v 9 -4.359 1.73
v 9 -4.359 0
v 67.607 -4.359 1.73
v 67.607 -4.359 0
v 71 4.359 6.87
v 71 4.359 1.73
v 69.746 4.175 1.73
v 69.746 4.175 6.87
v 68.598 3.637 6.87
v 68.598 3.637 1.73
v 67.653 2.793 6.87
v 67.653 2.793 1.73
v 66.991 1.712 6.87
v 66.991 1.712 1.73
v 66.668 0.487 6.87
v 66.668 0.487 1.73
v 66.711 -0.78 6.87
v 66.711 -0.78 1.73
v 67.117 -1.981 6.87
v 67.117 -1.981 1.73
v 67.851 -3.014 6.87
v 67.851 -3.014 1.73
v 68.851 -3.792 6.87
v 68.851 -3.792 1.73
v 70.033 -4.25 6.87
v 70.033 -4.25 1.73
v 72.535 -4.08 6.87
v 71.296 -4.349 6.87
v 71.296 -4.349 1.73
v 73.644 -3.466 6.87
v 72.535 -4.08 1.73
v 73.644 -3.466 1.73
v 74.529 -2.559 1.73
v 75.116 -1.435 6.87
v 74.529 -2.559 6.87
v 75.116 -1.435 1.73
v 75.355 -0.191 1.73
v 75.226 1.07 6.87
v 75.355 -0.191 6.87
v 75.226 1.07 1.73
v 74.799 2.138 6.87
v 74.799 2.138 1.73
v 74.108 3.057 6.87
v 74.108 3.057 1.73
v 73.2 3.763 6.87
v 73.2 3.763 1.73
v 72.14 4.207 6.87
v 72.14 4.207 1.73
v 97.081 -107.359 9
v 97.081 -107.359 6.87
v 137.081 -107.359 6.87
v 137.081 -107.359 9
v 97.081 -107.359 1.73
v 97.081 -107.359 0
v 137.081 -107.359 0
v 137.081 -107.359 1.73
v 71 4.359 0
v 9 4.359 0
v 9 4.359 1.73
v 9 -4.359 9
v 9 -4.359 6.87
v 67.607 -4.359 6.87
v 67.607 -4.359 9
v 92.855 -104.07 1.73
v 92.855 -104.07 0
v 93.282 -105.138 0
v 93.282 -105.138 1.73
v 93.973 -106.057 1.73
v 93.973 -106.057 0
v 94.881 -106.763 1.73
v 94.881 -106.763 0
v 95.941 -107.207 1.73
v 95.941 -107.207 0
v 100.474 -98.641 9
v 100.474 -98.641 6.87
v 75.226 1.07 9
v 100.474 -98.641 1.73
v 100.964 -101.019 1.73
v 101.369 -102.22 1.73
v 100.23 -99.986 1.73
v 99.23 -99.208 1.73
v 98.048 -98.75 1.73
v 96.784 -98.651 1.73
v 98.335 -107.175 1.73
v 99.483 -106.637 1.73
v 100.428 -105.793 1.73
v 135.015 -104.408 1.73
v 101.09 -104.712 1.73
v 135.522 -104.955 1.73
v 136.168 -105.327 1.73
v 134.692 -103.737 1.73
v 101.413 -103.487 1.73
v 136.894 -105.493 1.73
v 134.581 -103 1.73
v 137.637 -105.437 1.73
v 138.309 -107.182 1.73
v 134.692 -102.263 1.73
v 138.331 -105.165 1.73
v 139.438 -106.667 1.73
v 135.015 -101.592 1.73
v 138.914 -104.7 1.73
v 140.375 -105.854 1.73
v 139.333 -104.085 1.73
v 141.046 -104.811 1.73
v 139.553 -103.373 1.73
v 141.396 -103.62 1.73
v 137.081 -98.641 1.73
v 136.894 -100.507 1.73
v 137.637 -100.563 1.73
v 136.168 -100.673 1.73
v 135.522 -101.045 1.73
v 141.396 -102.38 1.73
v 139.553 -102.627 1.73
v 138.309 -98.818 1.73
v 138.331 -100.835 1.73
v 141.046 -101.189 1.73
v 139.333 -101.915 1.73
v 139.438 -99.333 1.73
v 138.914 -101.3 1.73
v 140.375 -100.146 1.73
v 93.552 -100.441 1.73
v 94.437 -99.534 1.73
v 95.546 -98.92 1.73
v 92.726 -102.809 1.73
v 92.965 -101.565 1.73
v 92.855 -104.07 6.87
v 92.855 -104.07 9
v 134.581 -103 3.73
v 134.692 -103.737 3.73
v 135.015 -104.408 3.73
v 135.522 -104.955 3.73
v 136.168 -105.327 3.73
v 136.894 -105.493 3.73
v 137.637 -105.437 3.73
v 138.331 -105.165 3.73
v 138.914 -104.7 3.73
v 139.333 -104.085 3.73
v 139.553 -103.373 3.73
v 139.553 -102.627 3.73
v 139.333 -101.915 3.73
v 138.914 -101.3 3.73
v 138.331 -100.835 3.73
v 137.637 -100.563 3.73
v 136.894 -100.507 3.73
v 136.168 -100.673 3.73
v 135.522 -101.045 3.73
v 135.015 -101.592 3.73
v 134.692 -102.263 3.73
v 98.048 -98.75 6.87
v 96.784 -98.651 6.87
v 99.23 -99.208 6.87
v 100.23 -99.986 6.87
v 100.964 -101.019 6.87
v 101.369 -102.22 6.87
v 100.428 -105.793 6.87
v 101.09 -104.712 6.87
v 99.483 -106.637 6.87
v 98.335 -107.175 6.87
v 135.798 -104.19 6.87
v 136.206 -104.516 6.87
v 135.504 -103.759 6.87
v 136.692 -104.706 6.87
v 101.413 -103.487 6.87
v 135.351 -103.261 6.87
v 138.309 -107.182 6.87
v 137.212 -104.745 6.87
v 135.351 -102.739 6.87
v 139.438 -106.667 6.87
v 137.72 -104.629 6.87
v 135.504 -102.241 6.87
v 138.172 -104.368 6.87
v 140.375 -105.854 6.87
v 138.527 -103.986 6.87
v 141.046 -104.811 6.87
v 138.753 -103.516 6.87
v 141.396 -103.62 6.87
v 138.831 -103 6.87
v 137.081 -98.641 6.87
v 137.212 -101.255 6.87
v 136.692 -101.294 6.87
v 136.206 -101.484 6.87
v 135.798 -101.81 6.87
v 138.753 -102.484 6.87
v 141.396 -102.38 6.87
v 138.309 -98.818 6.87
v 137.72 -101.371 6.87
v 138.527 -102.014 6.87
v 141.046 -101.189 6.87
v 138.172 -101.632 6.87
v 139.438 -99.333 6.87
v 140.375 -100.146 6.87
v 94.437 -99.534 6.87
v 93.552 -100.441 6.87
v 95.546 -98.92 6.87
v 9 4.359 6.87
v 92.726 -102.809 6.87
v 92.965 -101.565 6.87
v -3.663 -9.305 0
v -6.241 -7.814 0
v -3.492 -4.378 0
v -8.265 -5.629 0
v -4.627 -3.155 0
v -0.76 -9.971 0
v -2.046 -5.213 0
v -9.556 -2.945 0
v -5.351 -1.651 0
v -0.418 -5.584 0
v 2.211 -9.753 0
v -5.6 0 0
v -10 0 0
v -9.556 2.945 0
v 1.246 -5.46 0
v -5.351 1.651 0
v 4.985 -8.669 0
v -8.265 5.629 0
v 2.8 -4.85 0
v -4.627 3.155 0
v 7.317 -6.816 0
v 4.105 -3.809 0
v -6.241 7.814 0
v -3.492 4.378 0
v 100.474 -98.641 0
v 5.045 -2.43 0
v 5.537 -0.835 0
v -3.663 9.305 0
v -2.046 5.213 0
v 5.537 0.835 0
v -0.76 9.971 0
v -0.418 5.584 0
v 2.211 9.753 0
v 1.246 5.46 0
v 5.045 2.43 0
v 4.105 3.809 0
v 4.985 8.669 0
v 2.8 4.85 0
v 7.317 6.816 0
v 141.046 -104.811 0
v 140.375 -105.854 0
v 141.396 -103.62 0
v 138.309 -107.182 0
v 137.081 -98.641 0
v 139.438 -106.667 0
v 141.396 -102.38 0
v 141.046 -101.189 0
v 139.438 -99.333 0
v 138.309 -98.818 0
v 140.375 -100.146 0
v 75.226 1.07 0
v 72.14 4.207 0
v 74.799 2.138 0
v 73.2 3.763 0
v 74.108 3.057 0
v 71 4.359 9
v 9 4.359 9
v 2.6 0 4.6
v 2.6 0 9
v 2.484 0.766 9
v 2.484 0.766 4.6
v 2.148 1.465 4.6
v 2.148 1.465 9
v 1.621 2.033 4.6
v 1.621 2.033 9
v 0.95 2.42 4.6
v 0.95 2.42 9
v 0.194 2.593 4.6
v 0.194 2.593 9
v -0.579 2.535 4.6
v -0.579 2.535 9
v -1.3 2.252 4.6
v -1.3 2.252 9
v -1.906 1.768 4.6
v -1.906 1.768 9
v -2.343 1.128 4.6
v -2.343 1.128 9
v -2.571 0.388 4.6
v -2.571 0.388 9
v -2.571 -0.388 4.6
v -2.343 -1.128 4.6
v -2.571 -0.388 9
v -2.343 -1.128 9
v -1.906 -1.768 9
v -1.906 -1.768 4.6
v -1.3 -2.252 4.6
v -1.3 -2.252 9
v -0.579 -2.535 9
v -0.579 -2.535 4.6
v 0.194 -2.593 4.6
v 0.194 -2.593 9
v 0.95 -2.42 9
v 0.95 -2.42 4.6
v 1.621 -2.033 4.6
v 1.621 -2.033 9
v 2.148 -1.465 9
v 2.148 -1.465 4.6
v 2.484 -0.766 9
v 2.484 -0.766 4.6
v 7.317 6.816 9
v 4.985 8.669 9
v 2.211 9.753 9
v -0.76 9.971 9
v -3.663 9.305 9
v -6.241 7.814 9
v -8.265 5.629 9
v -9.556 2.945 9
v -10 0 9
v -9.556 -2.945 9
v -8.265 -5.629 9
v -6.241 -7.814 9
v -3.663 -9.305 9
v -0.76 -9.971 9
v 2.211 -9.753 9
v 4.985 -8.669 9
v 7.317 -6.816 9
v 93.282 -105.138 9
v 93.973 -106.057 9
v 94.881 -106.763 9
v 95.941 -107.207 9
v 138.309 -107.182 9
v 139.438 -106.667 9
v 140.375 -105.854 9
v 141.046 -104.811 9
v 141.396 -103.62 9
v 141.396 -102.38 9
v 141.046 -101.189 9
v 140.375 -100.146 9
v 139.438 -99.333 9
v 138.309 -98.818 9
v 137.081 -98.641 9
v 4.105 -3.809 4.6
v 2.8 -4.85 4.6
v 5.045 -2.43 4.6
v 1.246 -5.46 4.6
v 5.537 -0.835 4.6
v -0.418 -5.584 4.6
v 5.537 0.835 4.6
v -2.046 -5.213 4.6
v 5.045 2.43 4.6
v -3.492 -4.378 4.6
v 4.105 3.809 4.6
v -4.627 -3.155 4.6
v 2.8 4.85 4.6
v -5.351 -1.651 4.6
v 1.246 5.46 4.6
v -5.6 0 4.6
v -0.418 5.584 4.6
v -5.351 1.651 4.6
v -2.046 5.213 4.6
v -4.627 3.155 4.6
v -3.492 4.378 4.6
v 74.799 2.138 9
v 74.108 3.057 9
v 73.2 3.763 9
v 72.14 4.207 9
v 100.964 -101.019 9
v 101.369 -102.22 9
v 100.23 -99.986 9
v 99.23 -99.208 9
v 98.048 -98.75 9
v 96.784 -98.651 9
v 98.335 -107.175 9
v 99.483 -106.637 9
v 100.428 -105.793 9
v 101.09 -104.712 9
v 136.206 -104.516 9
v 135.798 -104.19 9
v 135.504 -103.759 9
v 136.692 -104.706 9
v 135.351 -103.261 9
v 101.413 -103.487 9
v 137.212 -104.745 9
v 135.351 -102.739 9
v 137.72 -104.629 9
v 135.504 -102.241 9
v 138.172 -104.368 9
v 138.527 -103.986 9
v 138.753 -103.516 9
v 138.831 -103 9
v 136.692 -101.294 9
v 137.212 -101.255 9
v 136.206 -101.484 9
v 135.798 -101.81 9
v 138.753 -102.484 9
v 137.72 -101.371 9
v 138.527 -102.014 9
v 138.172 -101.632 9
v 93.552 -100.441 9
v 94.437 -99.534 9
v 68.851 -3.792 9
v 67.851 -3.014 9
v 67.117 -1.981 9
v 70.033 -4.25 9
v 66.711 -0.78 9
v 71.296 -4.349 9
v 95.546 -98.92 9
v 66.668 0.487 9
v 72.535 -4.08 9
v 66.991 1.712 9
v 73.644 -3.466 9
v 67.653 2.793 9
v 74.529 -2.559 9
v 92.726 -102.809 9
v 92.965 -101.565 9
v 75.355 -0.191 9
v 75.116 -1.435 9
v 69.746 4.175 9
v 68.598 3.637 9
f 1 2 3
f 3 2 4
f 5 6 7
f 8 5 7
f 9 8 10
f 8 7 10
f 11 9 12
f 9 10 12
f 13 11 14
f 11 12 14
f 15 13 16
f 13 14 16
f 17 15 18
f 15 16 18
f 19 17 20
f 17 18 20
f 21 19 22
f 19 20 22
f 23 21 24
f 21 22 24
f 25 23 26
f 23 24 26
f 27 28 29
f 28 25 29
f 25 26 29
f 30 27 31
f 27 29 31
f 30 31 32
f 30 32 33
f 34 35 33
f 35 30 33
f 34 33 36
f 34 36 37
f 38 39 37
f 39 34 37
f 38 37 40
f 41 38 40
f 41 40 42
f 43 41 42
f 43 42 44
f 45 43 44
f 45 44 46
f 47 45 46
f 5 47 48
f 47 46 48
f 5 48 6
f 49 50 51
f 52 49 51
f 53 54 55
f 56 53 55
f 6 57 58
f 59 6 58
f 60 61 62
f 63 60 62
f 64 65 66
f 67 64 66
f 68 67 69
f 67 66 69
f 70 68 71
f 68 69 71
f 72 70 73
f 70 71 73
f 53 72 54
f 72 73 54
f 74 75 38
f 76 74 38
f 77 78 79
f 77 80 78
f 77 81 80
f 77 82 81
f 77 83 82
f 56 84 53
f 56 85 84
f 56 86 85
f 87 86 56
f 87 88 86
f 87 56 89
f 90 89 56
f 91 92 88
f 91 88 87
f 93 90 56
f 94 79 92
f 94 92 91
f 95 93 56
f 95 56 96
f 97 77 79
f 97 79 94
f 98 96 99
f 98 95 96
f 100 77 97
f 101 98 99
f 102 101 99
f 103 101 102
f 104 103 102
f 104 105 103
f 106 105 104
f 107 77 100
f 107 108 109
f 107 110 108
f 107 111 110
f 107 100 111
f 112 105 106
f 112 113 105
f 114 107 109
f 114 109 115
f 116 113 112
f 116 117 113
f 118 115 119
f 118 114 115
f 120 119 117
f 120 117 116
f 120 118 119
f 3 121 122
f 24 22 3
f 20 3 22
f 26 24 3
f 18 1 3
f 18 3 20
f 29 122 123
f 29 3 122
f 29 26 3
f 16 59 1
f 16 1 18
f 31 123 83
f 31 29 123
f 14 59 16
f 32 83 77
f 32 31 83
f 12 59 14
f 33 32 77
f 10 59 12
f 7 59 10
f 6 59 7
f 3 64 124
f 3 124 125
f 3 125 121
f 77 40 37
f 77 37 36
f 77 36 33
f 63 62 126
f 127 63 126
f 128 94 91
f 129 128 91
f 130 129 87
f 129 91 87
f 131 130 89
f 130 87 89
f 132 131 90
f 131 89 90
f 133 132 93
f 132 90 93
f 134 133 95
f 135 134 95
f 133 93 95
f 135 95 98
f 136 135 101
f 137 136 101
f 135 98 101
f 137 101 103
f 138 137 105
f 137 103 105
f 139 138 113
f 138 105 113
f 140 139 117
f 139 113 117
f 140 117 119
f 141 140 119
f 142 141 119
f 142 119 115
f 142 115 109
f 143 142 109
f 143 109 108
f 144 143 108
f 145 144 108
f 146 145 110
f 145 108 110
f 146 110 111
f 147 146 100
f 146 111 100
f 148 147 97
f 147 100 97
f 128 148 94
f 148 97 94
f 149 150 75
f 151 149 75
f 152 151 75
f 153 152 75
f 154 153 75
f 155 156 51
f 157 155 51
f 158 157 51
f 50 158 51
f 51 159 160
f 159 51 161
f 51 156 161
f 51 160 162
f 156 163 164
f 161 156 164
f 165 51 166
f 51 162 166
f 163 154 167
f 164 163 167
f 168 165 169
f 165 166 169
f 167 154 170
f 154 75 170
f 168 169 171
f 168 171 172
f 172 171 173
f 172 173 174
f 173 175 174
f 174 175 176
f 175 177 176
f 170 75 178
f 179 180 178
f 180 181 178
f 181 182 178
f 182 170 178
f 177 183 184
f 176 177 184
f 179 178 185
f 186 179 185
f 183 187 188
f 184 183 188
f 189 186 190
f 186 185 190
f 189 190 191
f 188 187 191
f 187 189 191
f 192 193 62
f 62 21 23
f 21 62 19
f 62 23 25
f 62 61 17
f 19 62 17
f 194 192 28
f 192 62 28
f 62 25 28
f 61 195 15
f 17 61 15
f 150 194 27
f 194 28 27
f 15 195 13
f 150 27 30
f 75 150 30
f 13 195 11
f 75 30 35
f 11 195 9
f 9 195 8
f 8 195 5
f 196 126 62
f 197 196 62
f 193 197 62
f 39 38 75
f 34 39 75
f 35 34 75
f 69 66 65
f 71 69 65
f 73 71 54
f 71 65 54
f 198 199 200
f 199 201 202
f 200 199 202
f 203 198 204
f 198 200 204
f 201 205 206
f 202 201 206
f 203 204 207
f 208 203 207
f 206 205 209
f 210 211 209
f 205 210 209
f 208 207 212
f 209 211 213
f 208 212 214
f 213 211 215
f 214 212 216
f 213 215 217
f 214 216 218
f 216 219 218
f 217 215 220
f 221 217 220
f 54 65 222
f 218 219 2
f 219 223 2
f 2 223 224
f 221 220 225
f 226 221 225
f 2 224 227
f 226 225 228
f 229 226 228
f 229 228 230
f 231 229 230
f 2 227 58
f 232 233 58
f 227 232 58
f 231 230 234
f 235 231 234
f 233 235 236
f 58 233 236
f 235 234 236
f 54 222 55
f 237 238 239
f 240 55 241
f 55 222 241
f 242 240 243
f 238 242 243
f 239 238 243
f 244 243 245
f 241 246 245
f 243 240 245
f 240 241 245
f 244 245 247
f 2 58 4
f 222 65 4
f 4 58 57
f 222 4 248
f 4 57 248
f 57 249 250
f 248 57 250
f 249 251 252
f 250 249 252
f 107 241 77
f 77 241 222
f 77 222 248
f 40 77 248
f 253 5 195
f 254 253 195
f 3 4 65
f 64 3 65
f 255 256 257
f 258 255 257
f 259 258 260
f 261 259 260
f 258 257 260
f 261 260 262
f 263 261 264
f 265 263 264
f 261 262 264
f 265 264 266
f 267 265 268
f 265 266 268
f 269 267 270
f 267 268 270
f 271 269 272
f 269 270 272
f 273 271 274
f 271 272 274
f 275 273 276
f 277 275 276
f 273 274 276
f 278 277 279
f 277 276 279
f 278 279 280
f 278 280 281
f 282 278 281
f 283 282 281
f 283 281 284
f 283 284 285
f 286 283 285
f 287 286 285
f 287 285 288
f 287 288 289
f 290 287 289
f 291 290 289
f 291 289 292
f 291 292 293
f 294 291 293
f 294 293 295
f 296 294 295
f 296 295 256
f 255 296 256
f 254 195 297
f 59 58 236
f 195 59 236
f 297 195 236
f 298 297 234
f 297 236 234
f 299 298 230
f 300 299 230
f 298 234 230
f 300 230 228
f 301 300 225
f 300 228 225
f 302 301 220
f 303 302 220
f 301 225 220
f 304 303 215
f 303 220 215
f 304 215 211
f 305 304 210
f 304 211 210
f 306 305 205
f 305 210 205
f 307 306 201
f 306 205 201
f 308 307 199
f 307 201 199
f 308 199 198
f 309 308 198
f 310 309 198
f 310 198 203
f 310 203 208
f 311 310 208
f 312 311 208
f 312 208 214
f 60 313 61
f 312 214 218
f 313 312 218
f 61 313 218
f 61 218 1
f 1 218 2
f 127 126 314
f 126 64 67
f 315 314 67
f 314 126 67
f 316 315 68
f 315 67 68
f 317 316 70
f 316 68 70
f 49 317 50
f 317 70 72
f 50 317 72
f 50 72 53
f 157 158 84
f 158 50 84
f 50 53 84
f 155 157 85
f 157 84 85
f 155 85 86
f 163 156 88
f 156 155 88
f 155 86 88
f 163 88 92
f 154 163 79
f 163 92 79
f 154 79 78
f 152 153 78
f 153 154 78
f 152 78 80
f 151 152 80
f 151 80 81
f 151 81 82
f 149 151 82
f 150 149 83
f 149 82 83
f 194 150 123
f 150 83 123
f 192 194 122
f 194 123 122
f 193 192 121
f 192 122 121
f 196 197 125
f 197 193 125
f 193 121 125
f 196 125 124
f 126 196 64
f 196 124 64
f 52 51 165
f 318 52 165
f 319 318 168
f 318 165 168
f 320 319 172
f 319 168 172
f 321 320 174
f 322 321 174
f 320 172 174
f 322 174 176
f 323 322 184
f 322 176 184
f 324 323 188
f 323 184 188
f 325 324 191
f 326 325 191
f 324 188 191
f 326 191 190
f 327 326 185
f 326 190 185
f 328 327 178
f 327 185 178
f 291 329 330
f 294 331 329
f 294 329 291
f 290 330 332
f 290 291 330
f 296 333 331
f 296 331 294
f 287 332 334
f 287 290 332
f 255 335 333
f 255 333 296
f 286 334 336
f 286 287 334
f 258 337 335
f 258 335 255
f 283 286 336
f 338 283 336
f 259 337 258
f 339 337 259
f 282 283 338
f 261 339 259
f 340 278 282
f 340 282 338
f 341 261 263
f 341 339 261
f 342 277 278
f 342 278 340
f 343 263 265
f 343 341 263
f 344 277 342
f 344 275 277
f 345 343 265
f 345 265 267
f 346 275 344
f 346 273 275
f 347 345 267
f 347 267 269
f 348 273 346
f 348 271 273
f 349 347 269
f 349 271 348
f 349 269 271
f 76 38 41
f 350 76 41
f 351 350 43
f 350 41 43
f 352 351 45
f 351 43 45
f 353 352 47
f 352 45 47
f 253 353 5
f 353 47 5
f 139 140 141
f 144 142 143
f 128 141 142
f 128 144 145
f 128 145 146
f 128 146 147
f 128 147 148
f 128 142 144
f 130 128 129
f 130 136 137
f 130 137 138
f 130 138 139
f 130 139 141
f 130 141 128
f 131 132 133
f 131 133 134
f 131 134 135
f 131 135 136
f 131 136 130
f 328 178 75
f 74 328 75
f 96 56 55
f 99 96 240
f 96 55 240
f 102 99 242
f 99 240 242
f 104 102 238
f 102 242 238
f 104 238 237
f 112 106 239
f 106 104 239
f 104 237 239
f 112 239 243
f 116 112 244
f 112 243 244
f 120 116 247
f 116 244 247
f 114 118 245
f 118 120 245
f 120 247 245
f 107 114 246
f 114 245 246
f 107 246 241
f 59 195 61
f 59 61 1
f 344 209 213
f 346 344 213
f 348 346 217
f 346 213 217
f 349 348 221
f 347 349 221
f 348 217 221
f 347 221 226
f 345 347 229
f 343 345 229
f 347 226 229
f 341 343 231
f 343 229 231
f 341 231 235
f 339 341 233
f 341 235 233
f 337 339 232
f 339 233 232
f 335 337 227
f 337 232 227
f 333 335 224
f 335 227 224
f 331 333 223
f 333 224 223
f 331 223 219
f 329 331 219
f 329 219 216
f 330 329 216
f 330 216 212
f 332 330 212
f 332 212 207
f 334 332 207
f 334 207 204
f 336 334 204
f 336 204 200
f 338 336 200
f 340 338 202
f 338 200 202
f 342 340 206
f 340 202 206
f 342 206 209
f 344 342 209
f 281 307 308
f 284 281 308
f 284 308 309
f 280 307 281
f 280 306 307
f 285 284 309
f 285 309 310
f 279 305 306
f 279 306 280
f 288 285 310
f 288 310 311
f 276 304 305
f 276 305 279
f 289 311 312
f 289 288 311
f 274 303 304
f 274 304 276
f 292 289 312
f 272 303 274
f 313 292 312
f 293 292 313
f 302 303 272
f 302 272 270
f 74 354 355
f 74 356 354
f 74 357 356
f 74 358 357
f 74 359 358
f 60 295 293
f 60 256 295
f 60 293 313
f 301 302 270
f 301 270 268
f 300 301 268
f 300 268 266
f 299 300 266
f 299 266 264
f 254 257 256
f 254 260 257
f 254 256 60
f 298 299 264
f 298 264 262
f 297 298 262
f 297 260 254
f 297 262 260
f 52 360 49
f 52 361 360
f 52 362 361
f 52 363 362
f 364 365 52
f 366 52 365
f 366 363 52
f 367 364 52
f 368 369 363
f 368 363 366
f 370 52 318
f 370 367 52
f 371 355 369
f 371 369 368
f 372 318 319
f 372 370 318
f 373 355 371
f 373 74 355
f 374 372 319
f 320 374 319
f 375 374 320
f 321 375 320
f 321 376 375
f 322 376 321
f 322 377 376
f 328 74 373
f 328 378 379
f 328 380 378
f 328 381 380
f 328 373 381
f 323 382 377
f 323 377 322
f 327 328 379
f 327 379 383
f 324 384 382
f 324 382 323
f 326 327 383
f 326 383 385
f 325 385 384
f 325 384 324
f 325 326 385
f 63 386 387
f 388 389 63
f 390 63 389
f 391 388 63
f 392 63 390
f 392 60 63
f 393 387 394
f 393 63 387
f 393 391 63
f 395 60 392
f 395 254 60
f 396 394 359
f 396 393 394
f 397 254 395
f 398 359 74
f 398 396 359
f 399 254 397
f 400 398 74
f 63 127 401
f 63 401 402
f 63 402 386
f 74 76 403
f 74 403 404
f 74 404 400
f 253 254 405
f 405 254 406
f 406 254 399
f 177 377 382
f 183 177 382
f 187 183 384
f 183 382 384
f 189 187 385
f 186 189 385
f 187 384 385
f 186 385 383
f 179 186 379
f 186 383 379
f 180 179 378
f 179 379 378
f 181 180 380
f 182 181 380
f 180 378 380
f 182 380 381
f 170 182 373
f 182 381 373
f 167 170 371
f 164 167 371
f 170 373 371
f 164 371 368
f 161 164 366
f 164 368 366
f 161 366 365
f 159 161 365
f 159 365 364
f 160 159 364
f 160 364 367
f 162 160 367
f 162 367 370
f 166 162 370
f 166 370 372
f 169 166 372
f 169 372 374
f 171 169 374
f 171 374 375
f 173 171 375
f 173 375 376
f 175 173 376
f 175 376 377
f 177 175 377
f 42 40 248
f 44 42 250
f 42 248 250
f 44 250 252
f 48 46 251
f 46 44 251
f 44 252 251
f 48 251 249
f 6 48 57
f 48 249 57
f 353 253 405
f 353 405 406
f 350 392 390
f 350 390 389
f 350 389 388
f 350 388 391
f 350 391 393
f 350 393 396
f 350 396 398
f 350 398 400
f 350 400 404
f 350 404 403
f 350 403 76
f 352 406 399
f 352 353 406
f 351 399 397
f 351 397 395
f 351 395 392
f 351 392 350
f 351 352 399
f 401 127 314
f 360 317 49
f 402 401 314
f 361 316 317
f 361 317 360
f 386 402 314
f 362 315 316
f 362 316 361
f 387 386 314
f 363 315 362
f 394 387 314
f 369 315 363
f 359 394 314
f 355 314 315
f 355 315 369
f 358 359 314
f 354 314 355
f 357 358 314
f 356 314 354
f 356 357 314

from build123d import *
from build123d.topology import SkipClean

# Parameters (mm, degrees)
EXTRUDE_1_DEPTH     = 9
SKETCH_2_R          = 5.6
CUT_EXTRUDE_1_DEPTH = 4.6
SKETCH_3_R          = 2.6
CUT_EXTRUDE_2_DEPTH = 178.798114195
SKETCH_5_W          = 132.43986789
SKETCH_5_H          = 5.139725872
CUT_EXTRUDE_3_DEPTH = 181.463576917
EXTRUDE_START       = -7.270147681
SKETCH_6_R          = 4.358898944
EXTRUDE_2_DEPTH     = 7.270147681
SKETCH_7_R          = 4.358898944
EXTRUDE_3_DEPTH     = 7.270147681
SKETCH_8_R          = 2.5
EXTRUDE_4_DEPTH     = 2
CUT_EXTRUDE_4_REACH = 179.798
SKETCH_9_R          = 1.75


with BuildPart() as part:
    # 草图1 → 凸台-拉伸1 (new body)
    with BuildSketch(Plane.XY):
        with BuildLine():
            Line((97.080968947, -107.358898944), (137.080968947, -107.358898944))
            ThreePointArc((137.080968947, -107.358898944), (141.43986789, -103), (137.080968947, -98.641101056))
            Line((137.080968947, -98.641101056), (100.473705575, -98.641101056))
            Line((100.473705575, -98.641101056), (75.225539013, 1.069962639))
            ThreePointArc((75.225539013, 1.069962639), (73.67732525, 3.439757187), (71, 4.358898944))
            Line((71, 4.358898944), (9, 4.358898944))
            ThreePointArc((9, 4.358898944), (-10, 0), (9, -4.358898944))
            Line((9, -4.358898944), (67.607263372, -4.358898944))
            Line((67.607263372, -4.358898944), (92.855429934, -104.069962639))
            ThreePointArc((92.855429934, -104.069962639), (94.403643697, -106.439757187), (97.080968947, -107.358898944))
        make_face()
    extrude(amount=EXTRUDE_1_DEPTH)

    # 草图2 → 切除-拉伸1 (cut)
    with BuildSketch(Plane(origin=(0, 0, 0), x_dir=(-1, 0, 0), z_dir=(0, 0, -1))):
        Circle(SKETCH_2_R)
    extrude(amount=-CUT_EXTRUDE_1_DEPTH, mode=Mode.SUBTRACT)

    # 草图3 → 切除-拉伸2 (cut, through all)
    with BuildSketch(Plane.XY.offset(9)):
        Circle(SKETCH_3_R)
    extrude(amount=-CUT_EXTRUDE_2_DEPTH, mode=Mode.SUBTRACT)

    # 草图5 → 切除-拉伸3 (cut, through all)
    with BuildSketch(Plane(origin=(0, 4.358898944, 0), x_dir=(1, 0, 0), z_dir=(0, 1, 0))):
        with Locations((75.219933945, -4.299715255)):
            Rectangle(SKETCH_5_W, SKETCH_5_H)
    extrude(amount=-CUT_EXTRUDE_3_DEPTH, mode=Mode.SUBTRACT)

    # 草图6 → 凸台-拉伸2 (add)
    with SkipClean():  # the faces are left unmerged after this step: merging them gives an invalid solid
        with BuildSketch(Plane.XY.offset(9).offset(EXTRUDE_START)):
            with Locations(Location((71, 0, 0), (0, 0, 90))):
                Circle(SKETCH_6_R)
        extrude(amount=EXTRUDE_2_DEPTH)

    # 草图7 → 凸台-拉伸3 (add)
    with SkipClean():  # the faces are left unmerged after this step: merging them gives an invalid solid
        with BuildSketch(Plane.XY.offset(9).offset(EXTRUDE_START)):
            with Locations(Location((97.080968947, -103, 0), (0, 0, 194.209390146))):
                Circle(SKETCH_7_R)
        extrude(amount=EXTRUDE_3_DEPTH)

    # 草图8 → 凸台-拉伸4 (add)
    with SkipClean():  # the faces are left unmerged after this step: merging them gives an invalid solid
        with BuildSketch(Plane.XY.offset(1.729852319)):
            with Locations(Location((137.080968947, -103, 0), (0, 0, 180))):
                Circle(SKETCH_8_R)
        extrude(amount=EXTRUDE_4_DEPTH)

    # 草图9 → 切除-拉伸4 (cut, up to next)
    with BuildSketch(Plane.XY.offset(9), mode=Mode.PRIVATE) as cut_extrude_4_sk1:
        with Locations((137.080968947, -103)):
            Circle(SKETCH_9_R)
    cut_extrude_4_tool1 = extrude(cut_extrude_4_sk1.sketch, amount=-CUT_EXTRUDE_4_REACH, mode=Mode.PRIVATE) & part.part
    add(cut_extrude_4_tool1.solids().sort_by_distance((137.080969, -103, 9))[0], mode=Mode.SUBTRACT)


solid = part.part
